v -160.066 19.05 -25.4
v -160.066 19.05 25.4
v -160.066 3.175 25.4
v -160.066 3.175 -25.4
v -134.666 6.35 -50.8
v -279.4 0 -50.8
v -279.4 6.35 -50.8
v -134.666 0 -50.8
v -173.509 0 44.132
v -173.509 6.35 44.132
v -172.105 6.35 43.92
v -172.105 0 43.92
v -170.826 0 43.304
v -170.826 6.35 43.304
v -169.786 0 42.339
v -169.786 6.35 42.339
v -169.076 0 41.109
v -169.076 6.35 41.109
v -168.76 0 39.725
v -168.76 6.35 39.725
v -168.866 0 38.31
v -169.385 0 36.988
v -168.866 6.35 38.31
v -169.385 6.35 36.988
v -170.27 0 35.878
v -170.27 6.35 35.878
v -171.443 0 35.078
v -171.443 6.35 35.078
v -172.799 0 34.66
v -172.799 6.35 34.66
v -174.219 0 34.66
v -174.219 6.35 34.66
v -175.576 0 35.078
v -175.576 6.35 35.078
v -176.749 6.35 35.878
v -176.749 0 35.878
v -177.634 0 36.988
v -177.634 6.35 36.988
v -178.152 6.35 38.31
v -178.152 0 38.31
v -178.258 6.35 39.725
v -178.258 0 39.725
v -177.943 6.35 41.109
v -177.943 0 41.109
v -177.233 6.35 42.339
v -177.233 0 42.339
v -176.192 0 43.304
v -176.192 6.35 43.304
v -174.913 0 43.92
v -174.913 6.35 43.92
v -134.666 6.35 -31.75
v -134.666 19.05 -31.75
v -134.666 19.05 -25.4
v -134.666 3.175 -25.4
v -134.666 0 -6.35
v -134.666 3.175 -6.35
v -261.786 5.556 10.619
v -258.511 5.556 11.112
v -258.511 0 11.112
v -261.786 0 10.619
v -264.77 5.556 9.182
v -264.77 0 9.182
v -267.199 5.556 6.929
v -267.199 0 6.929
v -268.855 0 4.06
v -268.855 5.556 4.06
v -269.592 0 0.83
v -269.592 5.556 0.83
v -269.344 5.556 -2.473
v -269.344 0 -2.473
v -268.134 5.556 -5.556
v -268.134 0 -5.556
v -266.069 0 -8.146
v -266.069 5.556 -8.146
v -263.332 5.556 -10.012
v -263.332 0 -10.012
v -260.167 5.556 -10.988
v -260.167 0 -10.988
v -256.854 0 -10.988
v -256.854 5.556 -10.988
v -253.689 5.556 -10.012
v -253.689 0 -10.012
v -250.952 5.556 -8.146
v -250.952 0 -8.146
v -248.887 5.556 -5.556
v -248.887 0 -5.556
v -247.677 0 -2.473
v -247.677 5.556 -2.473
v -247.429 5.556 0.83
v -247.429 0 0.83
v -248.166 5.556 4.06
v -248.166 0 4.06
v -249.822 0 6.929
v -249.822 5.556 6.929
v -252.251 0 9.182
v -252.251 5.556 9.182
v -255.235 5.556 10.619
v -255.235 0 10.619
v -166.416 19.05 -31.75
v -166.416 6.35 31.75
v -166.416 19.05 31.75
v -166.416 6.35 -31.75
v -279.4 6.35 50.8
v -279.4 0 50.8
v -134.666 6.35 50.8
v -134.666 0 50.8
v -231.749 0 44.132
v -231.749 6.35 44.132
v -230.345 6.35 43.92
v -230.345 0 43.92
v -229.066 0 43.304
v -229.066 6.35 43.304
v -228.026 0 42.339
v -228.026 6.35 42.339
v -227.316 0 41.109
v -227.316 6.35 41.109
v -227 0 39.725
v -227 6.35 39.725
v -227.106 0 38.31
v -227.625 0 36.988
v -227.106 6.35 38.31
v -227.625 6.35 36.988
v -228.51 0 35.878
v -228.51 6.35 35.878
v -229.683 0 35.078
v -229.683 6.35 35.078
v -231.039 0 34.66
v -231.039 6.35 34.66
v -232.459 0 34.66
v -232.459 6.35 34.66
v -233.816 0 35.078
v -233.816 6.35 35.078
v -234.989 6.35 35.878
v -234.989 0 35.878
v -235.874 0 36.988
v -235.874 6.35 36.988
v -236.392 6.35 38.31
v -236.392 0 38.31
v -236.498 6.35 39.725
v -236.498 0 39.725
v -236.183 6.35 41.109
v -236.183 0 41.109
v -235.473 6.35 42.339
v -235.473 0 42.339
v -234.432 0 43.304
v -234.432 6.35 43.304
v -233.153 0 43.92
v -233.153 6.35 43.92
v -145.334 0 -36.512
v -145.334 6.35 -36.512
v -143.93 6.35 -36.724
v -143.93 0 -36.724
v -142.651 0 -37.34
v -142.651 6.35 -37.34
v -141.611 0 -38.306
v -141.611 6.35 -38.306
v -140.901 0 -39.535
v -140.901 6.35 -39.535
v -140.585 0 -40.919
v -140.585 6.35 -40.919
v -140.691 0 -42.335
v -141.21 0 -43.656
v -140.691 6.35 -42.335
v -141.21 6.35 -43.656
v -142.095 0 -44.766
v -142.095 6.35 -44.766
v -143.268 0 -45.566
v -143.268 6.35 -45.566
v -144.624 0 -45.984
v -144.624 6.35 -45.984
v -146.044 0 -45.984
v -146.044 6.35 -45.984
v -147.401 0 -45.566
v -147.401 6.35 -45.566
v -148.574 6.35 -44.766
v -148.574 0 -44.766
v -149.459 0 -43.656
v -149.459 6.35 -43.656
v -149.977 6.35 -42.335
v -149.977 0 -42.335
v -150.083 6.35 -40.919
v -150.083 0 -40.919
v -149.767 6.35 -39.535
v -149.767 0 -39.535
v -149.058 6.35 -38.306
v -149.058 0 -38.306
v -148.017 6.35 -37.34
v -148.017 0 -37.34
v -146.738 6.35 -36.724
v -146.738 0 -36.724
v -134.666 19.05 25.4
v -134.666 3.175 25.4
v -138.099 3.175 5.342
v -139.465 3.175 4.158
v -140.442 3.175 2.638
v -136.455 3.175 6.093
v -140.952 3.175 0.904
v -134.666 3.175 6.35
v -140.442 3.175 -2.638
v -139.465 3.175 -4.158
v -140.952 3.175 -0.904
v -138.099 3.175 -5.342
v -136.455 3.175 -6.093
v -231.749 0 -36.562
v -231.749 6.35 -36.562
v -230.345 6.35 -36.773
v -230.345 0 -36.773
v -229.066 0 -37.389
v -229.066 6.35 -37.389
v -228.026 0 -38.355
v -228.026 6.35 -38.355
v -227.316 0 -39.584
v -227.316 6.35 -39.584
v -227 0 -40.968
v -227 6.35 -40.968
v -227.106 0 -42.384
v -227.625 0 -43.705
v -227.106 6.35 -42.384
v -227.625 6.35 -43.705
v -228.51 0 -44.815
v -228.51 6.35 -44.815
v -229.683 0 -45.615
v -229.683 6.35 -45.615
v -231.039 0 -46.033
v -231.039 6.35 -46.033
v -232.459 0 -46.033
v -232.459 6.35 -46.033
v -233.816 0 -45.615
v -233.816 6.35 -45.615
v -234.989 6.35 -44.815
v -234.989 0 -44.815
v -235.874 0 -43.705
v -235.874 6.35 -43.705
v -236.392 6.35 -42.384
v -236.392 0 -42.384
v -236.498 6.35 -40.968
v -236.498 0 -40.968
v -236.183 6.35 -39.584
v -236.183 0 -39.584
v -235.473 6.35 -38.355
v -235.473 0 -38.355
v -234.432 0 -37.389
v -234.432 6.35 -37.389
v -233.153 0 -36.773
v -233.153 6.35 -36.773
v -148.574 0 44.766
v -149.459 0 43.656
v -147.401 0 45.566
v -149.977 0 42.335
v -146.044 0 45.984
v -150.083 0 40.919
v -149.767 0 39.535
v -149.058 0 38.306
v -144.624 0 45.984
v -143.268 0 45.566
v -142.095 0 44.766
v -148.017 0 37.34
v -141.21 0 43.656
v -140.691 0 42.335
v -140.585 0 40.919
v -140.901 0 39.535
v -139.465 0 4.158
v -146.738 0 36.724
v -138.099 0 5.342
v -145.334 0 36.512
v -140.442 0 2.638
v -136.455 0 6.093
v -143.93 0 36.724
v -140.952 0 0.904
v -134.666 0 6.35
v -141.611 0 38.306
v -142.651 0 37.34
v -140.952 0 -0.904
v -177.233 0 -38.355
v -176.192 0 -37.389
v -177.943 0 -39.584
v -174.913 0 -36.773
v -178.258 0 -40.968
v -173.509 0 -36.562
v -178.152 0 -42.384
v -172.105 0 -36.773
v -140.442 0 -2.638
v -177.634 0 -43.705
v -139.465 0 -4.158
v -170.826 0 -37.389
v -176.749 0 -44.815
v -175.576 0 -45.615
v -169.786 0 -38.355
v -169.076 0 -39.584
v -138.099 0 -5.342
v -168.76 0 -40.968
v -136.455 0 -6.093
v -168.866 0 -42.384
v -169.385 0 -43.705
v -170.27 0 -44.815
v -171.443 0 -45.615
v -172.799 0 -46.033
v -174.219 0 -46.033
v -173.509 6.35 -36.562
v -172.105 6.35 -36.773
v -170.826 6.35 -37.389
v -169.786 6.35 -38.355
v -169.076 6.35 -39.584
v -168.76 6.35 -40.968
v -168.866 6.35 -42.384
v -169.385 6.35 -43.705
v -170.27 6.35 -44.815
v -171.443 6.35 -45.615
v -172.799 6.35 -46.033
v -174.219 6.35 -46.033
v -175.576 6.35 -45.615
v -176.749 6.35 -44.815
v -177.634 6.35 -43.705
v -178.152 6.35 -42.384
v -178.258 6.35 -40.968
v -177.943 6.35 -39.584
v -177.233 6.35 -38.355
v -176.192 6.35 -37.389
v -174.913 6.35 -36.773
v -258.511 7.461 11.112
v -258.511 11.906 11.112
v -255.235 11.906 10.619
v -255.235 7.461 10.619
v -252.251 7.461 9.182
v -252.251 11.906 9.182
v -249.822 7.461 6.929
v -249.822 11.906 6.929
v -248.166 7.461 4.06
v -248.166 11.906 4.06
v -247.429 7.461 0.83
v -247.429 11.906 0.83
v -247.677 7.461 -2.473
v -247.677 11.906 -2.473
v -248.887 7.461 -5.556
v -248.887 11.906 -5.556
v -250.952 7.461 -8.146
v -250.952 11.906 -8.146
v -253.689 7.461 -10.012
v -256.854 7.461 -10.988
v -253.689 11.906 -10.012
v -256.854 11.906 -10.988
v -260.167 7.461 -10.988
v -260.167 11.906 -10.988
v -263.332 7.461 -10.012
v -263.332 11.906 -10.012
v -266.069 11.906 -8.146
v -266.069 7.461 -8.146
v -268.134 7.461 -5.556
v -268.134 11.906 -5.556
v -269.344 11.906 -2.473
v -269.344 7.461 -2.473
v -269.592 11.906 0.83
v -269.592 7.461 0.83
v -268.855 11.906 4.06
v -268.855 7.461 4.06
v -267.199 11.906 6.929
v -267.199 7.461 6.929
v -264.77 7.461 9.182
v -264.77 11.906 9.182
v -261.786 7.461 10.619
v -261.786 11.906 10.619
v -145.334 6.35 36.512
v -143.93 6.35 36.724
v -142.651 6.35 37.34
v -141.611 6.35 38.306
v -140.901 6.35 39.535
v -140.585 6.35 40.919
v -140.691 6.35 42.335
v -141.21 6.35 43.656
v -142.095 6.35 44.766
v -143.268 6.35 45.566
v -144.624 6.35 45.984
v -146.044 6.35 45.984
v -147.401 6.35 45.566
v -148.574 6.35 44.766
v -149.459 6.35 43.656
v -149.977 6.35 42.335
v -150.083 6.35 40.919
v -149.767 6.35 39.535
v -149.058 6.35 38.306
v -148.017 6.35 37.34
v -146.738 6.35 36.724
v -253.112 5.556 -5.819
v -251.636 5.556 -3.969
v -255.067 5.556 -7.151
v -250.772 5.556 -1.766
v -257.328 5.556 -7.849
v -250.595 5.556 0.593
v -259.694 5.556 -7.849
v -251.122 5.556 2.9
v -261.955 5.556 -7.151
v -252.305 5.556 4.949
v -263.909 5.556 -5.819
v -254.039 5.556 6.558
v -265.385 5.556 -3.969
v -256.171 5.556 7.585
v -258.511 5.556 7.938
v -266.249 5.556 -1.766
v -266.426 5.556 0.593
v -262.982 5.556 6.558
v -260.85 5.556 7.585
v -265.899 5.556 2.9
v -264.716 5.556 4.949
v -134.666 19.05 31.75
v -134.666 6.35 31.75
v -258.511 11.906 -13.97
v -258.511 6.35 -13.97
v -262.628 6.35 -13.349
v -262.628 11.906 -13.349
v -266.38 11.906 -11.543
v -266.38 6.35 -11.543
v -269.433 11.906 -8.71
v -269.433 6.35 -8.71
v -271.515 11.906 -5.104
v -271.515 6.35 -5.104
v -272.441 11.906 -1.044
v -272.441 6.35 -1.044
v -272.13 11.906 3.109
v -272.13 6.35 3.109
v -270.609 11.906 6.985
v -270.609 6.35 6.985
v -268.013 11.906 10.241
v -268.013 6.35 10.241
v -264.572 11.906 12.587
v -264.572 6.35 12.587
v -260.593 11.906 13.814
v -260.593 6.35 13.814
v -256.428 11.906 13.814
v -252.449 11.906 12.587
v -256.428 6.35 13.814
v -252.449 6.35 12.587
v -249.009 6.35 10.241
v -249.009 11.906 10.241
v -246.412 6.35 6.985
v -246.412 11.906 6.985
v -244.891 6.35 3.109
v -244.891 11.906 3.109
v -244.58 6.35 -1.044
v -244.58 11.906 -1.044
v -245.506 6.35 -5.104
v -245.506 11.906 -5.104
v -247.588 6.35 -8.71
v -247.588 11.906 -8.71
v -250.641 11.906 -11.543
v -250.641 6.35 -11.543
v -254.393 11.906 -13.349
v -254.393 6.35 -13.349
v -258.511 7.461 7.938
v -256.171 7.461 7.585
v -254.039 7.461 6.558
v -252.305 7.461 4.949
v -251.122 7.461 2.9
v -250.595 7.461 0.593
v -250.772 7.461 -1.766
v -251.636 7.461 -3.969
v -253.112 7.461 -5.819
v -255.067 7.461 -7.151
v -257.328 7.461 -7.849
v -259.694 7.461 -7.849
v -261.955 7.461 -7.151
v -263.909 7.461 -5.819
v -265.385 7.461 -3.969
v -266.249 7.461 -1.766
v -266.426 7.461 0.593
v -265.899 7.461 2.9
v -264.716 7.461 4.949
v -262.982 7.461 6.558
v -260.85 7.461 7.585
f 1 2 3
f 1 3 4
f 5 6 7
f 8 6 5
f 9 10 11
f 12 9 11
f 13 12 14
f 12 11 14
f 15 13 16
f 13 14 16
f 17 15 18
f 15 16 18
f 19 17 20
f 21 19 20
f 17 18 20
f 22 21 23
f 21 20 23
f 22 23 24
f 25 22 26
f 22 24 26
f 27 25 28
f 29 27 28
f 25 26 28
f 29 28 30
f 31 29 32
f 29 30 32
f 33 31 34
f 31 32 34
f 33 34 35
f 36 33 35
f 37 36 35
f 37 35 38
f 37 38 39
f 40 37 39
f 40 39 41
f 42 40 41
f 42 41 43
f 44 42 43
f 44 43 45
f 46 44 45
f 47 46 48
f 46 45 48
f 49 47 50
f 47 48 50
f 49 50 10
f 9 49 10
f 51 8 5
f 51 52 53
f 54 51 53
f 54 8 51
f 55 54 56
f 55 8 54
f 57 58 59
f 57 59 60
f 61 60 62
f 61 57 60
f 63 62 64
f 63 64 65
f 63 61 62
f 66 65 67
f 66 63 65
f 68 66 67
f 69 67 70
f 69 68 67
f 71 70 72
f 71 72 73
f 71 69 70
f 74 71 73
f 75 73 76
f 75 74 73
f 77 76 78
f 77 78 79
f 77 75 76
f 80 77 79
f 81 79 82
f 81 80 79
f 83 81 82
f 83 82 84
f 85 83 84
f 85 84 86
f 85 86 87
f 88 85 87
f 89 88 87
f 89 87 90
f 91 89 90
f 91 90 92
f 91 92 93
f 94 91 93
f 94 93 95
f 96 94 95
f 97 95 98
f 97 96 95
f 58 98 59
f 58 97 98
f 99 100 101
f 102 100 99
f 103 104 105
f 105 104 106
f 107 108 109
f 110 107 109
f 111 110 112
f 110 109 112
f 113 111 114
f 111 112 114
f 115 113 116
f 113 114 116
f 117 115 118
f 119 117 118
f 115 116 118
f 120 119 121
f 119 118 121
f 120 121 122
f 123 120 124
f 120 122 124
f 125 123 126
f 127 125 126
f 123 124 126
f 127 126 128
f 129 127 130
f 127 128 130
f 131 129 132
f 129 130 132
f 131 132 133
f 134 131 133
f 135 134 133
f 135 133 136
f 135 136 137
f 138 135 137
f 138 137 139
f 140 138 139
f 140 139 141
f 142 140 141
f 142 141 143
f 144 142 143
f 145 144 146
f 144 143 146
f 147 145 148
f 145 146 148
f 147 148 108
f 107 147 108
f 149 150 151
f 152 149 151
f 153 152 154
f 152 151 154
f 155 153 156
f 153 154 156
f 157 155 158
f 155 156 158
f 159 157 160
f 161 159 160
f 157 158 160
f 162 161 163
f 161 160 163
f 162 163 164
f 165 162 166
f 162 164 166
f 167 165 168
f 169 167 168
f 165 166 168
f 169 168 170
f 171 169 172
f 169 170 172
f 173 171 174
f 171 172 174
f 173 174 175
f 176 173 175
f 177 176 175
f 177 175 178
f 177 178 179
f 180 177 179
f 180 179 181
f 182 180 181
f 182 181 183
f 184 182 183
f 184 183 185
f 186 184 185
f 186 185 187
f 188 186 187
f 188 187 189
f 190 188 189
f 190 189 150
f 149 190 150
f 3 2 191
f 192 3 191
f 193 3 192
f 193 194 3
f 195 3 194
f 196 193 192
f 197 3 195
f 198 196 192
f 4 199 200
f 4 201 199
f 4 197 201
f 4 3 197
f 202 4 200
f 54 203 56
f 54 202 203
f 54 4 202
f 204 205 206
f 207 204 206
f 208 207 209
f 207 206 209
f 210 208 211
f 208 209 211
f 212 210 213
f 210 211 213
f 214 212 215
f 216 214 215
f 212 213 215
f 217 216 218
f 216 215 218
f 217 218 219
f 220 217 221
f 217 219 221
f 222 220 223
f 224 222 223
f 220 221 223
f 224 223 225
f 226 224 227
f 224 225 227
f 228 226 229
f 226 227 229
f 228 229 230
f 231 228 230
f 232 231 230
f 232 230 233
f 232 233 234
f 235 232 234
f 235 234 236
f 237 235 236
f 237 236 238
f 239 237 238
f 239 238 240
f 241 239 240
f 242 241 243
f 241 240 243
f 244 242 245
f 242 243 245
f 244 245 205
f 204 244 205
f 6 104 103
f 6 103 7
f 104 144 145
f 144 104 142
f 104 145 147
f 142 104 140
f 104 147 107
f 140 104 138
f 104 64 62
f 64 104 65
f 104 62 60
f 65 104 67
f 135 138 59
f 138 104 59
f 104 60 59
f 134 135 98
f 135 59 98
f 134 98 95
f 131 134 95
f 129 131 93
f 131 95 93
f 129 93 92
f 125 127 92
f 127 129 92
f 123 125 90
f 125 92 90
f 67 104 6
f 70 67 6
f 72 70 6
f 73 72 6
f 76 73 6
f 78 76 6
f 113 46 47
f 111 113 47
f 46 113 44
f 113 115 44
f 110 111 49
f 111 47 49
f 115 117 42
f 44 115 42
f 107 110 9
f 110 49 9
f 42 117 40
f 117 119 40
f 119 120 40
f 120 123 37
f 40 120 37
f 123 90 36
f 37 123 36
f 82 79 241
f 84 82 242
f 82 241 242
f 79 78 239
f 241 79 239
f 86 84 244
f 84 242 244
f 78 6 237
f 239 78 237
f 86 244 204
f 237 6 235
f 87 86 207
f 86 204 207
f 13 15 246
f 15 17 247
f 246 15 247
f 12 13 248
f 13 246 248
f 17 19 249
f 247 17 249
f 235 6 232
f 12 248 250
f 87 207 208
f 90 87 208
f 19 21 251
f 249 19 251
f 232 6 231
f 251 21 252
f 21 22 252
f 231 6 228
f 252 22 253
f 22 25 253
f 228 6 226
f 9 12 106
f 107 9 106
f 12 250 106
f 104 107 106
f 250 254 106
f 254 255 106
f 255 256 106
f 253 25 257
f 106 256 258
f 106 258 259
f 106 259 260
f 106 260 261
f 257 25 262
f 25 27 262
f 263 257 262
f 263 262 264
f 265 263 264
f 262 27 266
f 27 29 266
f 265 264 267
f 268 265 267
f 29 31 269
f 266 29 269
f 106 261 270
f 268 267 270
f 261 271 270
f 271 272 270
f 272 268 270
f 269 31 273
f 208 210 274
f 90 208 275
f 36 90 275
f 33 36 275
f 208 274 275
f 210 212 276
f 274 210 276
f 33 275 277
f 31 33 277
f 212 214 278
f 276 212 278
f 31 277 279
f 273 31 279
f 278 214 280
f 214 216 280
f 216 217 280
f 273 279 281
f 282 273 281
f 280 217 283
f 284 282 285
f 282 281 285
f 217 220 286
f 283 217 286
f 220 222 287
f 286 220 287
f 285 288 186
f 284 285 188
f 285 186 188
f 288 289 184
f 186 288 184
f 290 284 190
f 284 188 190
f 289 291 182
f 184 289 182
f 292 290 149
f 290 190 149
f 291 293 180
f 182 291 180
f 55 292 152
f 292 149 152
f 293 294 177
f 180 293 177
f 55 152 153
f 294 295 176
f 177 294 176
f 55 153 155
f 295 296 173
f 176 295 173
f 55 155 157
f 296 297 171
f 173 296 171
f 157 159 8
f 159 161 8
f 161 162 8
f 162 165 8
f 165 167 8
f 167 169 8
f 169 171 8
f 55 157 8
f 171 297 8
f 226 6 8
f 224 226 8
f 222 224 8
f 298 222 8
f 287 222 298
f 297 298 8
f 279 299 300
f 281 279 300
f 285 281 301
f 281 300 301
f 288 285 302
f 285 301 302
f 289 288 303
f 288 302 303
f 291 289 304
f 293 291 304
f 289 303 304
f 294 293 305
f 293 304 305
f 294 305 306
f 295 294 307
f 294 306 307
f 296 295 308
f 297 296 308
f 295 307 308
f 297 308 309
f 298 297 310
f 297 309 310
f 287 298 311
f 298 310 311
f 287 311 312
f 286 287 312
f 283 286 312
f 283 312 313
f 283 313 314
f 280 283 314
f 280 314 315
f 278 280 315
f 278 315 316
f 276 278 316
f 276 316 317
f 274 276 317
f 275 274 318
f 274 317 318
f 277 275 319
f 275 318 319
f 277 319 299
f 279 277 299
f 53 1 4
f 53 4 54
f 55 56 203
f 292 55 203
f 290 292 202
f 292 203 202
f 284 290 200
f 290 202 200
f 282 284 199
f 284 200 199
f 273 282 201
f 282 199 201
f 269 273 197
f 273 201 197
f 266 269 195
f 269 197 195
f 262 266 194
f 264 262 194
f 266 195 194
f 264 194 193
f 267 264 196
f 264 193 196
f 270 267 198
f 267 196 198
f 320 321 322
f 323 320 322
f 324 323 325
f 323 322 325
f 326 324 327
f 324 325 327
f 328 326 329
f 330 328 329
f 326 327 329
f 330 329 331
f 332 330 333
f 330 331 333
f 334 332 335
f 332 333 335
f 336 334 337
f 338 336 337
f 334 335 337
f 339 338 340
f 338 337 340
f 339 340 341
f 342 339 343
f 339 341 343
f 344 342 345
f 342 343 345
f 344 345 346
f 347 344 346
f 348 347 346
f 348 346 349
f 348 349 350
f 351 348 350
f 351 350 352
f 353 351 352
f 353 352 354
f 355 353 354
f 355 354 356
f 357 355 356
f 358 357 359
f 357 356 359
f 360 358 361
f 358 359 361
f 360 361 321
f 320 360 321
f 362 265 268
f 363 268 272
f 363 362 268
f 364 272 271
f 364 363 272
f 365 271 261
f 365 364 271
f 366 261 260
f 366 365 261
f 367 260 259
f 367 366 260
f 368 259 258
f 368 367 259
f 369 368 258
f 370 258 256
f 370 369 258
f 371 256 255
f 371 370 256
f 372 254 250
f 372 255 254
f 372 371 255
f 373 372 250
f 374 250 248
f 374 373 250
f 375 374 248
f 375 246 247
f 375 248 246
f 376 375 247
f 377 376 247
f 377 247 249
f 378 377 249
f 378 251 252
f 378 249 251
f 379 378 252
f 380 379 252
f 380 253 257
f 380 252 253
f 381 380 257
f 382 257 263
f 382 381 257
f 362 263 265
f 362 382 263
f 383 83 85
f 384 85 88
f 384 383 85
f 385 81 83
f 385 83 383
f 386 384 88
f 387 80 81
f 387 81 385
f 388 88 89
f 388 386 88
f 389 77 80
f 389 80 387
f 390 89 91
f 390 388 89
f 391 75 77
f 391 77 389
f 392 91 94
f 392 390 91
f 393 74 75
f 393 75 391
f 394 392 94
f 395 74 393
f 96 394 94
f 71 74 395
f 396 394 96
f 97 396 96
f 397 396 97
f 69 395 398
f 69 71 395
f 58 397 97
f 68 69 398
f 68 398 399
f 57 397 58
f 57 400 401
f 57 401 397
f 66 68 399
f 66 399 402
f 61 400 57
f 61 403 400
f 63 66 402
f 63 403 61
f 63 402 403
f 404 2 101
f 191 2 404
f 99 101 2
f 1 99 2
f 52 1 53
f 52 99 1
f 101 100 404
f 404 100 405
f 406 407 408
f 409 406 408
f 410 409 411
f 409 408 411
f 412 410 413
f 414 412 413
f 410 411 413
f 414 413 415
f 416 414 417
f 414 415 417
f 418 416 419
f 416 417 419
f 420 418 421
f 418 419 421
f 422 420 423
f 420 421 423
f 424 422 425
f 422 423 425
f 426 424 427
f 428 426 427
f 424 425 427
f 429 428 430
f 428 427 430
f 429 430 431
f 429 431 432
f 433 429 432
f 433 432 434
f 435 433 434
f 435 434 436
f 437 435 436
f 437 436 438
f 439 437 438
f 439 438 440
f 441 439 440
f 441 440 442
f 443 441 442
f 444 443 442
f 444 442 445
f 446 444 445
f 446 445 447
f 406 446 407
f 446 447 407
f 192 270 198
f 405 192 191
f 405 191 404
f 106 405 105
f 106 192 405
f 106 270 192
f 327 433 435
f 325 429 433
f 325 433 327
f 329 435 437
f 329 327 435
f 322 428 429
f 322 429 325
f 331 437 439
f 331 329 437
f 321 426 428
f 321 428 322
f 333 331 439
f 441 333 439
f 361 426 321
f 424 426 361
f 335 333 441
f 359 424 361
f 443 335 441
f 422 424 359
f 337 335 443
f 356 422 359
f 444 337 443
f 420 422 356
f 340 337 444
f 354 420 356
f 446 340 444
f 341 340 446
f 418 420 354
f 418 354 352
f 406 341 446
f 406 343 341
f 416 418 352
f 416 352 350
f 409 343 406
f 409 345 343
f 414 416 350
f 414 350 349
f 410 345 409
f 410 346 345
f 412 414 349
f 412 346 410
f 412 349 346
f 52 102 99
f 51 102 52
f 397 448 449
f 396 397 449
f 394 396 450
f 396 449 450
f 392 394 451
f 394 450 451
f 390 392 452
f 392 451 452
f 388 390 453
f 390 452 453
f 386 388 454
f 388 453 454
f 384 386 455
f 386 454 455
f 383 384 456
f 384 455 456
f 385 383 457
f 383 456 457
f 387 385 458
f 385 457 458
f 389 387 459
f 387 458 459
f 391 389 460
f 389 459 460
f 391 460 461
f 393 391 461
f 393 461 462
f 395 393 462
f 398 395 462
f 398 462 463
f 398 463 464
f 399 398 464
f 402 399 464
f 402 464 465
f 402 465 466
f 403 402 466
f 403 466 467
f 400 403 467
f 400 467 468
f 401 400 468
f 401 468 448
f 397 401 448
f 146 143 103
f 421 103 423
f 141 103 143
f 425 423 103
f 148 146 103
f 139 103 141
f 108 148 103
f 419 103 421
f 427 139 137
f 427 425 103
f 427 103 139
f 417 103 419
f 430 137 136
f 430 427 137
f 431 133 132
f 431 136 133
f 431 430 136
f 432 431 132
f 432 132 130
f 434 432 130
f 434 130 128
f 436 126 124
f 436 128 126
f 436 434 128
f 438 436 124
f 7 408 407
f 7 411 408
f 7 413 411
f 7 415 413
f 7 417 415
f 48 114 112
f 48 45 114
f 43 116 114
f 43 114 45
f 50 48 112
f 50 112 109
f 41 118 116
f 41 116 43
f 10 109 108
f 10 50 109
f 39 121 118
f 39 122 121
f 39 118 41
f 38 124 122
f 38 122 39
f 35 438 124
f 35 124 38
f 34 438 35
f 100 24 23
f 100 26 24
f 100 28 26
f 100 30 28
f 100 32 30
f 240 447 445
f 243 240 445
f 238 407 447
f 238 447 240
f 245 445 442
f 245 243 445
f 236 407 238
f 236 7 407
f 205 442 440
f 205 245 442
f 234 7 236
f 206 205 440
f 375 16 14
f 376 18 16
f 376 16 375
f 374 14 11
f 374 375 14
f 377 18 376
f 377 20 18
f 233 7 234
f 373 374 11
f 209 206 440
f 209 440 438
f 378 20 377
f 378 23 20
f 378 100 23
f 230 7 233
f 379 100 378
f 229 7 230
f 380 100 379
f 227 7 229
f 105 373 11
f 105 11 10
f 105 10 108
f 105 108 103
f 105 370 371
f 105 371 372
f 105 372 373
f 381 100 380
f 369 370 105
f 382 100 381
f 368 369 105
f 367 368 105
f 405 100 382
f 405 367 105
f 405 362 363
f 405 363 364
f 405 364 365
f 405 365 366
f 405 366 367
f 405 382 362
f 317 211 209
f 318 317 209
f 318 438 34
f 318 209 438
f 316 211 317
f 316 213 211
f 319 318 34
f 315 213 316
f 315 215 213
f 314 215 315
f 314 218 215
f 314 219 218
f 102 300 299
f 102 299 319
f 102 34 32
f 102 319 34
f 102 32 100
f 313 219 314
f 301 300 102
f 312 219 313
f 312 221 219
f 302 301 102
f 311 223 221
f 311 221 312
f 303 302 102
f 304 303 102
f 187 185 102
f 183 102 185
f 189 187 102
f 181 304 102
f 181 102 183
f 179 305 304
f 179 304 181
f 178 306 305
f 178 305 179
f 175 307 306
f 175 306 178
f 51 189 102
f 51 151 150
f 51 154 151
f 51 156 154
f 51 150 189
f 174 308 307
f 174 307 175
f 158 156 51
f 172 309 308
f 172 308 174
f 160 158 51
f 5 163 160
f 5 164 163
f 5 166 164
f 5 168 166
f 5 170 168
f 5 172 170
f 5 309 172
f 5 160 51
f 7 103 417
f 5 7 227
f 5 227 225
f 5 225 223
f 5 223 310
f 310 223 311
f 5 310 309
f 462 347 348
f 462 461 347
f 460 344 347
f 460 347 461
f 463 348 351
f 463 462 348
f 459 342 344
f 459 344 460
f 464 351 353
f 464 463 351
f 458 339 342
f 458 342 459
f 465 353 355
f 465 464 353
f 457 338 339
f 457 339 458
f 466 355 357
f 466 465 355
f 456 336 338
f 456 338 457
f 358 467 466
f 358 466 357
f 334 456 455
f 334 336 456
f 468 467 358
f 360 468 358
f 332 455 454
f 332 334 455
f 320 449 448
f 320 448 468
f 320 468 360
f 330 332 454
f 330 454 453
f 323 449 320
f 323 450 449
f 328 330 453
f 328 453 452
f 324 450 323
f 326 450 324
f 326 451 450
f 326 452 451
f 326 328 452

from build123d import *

# Parameters (mm, degrees)
SKETCH1_W               = 279.4
SKETCH1_H               = 101.6
BOSS_EXTRUDE1_DEPTH     = 6.35
SKETCH2_R               = 13.97
BOSS_EXTRUDE3_DEPTH     = 5.55625
SKETCH9_R               = 11.1125
CUT_EXTRUDE4_DEPTH      = 4.445
CUT_EXTRUDE5_START      = -5.55625
SKETCH10_R              = 11.1125
CUT_EXTRUDE5_DEPTH      = 5.55625
SKETCH11_R              = 7.9375
CUT_EXTRUDE6_DEPTH      = 285.078633923
SKETCH12_R              = 6.35
CUT_EXTRUDE7_DEPTH      = 285.051619429
SKETCH22_W              = 63.5
SKETCH22_H              = 63.5
BOSS_EXTRUDE7_DEPTH     = 12.7
SKETCH25_W              = 50.8
SKETCH25_H              = 50.8
CUT_EXTRUDE11_DEPTH     = 15.875
SKETCH32_R              = 4.7625
CUT_EXTRUDE12_DEPTH     = 6.35
SKETCH38_W              = 46.99
SKETCH38_H              = 18.470251096
CUT_EXTRUDE13_DEPTH     = 6.35
SKETCH60_R              = 4.7625
CUT_EXTRUDE23_DEPTH     = 6.35
CUT_EXTRUDE24_START     = -6.35
CUT_EXTRUDE24_OUTLINE_R = 4.7625
CUT_EXTRUDE24_DEPTH     = 19.05
SKETCH62_R              = 4.7625
CUT_EXTRUDE25_DEPTH     = 285.264471927


# Read off the part's stored shape, not the designer's step: Cut-Extrude24
with BuildPart() as part:
    # Sketch1 → Boss-Extrude1 (new body)
    with BuildSketch(Plane(origin=(0, 0, 0), x_dir=(1, 0, 0), z_dir=(0, 1, 0))):
        with Locations((-139.7, 0)):
            Rectangle(SKETCH1_W, SKETCH1_H)
    extrude(amount=BOSS_EXTRUDE1_DEPTH)

    # Sketch2 → Boss-Extrude3 (add)
    with BuildSketch(Plane(origin=(0, 6.35, 0), x_dir=(1, 0, 0), z_dir=(0, 1, 0))):
        with Locations(Location((-258.510557857, 0, 0), (0, 0, 90))):
            Circle(SKETCH2_R)
    extrude(amount=BOSS_EXTRUDE3_DEPTH)

    # Sketch9 → Cut-Extrude4 (cut)
    with BuildSketch(Plane(origin=(0, 11.90625, 0), x_dir=(1, 0, 0), z_dir=(0, 1, 0))):
        with Locations(Location((-258.510557857, 0, 0), (0, 0, 270))):
            Circle(SKETCH9_R)
    extrude(amount=-CUT_EXTRUDE4_DEPTH, mode=Mode.SUBTRACT)

    # Sketch10 → Cut-Extrude5 (cut)
    with BuildSketch(Plane(origin=(0, 0, 0), x_dir=(-1, 0, 0), z_dir=(0, -1, 0)).offset(CUT_EXTRUDE5_START)):
        with Locations(Location((258.510557857, 0, 0), (0, 0, 270))):
            Circle(SKETCH10_R)
    extrude(amount=CUT_EXTRUDE5_DEPTH, mode=Mode.SUBTRACT)

    # Sketch11 → Cut-Extrude6 (cut, through all)
    with BuildSketch(Plane(origin=(0, 7.46125, 0), x_dir=(1, 0, 0), z_dir=(0, 1, 0))):
        with Locations(Location((-258.510557857, 0, 0), (0, 0, 270))):
            Circle(SKETCH11_R)
    extrude(amount=-CUT_EXTRUDE6_DEPTH, mode=Mode.SUBTRACT)

    # Sketch12 → Cut-Extrude7 (cut, through all)
    with BuildSketch(Plane(origin=(0, 6.35, 0), x_dir=(1, 0, 0), z_dir=(0, 1, 0))):
        with Locations(Location((-134.666203771, 0, 0), (0, 0, 270))):
            Circle(SKETCH12_R)
    extrude(amount=-CUT_EXTRUDE7_DEPTH, mode=Mode.SUBTRACT)

    # Sketch22 → Boss-Extrude7 (add)
    with BuildSketch(Plane(origin=(0, 6.35, 0), x_dir=(1, 0, 0), z_dir=(0, 1, 0))):
        with Locations((-134.666203771, 0)):
            Rectangle(SKETCH22_W, SKETCH22_H)
    extrude(amount=BOSS_EXTRUDE7_DEPTH)

    # Sketch25 → Cut-Extrude11 (cut)
    with BuildSketch(Plane(origin=(0, 19.05, 0), x_dir=(1, 0, 0), z_dir=(0, 1, 0))):
        with Locations((-134.666203771, 0)):
            Rectangle(SKETCH25_W, SKETCH25_H)
    extrude(amount=-CUT_EXTRUDE11_DEPTH, mode=Mode.SUBTRACT)

    # Sketch32 → Cut-Extrude12 (cut)
    with BuildSketch(Plane(origin=(0, 6.35, 0), x_dir=(1, 0, 0), z_dir=(0, 1, 0))):
        with Locations(Location((-67.44195898, -40.64, 0), (0, 0, 270))):
            Circle(SKETCH32_R)
        with Locations(Location((-81.41195898, -40.64, 0), (0, 0, 270))):
            Circle(SKETCH32_R)
        with Locations(Location((-67.44195898, 40.64, 0), (0, 0, 270))):
            Circle(SKETCH32_R)
        with Locations(Location((-81.41195898, 40.64, 0), (0, 0, 270))):
            Circle(SKETCH32_R)
    extrude(amount=-CUT_EXTRUDE12_DEPTH, mode=Mode.SUBTRACT)

    # Sketch38 → Cut-Extrude13 (cut)
    with BuildSketch(Plane(origin=(0, 6.35, 0), x_dir=(1, 0, 0), z_dir=(0, 1, 0))):
        with Locations((-23.495, -24.777709652)):
            Rectangle(SKETCH38_W, SKETCH38_H)
    extrude(amount=-CUT_EXTRUDE13_DEPTH, mode=Mode.SUBTRACT)

    # Sketch60 → Cut-Extrude23 (cut)
    with BuildSketch(Plane(origin=(0, 6.35, 0), x_dir=(1, 0, 0), z_dir=(0, 1, 0))):
        with Locations(Location((-231.7492444, 41.324145444, 0), (0, 0, 270))):
            Circle(SKETCH60_R)
        with Locations(Location((-231.7492444, -39.369341378, 0), (0, 0, 270))):
            Circle(SKETCH60_R)
        with Locations(Location((-173.509244294, -39.369341378, 0), (0, 0, 270))):
            Circle(SKETCH60_R)
        with Locations(Location((-173.509244294, 41.324145444, 0), (0, 0, 270))):
            Circle(SKETCH60_R)
    extrude(amount=-CUT_EXTRUDE23_DEPTH, mode=Mode.SUBTRACT)

    # Cut-Extrude24 outline → Cut-Extrude24 (cut)
    with BuildSketch(Plane(origin=(0, 6.35, 0), x_dir=(1, 0, 0), z_dir=(0, 1, 0)).offset(CUT_EXTRUDE24_START)):
        with BuildLine():
            Line((-134.666203771, -50.8), (0, -50.8))
            Line((0, -50.8), (0, -34.0128352))
            Line((0, -34.0128352), (-46.99, -34.0128352))
            Line((-46.99, -34.0128352), (-46.99, -15.542584104))
            Line((-46.99, -15.542584104), (0, -15.542584104))
            Line((0, -15.542584104), (0, 50.8))
            Line((0, 50.8), (-134.666203771, 50.8))
            Line((-134.666203771, 50.8), (-134.666203771, 6.35))
            ThreePointArc((-134.666203771, 6.35), (-128.316203771, 0), (-134.666203771, -6.35))
            Line((-134.666203771, -6.35), (-134.666203771, -50.8))
        make_face()
        with Locations((-81.41195898, -40.64)):
            Circle(CUT_EXTRUDE24_OUTLINE_R, mode=Mode.SUBTRACT)
        with Locations((-67.44195898, -40.64)):
            Circle(CUT_EXTRUDE24_OUTLINE_R, mode=Mode.SUBTRACT)
        with Locations((-81.41195898, 40.64)):
            Circle(CUT_EXTRUDE24_OUTLINE_R, mode=Mode.SUBTRACT)
        with Locations((-67.44195898, 40.64)):
            Circle(CUT_EXTRUDE24_OUTLINE_R, mode=Mode.SUBTRACT)
    extrude(amount=CUT_EXTRUDE24_DEPTH, mode=Mode.SUBTRACT)

    # Sketch62 → Cut-Extrude25 (cut, through all)
    with BuildSketch(Plane(origin=(0, 6.35, 0), x_dir=(1, 0, 0), z_dir=(0, 1, 0))):
        with Locations(Location((-145.334203771, 41.275, 0), (0, 0, 270))):
            Circle(SKETCH62_R)
    cut_extrude25 = extrude(amount=-CUT_EXTRUDE25_DEPTH, mode=Mode.SUBTRACT)

    # Mirror1: Cut-Extrude25 across plane
    add(cut_extrude25.mirror(Plane.XY), mode=Mode.SUBTRACT)


solid = part.part
